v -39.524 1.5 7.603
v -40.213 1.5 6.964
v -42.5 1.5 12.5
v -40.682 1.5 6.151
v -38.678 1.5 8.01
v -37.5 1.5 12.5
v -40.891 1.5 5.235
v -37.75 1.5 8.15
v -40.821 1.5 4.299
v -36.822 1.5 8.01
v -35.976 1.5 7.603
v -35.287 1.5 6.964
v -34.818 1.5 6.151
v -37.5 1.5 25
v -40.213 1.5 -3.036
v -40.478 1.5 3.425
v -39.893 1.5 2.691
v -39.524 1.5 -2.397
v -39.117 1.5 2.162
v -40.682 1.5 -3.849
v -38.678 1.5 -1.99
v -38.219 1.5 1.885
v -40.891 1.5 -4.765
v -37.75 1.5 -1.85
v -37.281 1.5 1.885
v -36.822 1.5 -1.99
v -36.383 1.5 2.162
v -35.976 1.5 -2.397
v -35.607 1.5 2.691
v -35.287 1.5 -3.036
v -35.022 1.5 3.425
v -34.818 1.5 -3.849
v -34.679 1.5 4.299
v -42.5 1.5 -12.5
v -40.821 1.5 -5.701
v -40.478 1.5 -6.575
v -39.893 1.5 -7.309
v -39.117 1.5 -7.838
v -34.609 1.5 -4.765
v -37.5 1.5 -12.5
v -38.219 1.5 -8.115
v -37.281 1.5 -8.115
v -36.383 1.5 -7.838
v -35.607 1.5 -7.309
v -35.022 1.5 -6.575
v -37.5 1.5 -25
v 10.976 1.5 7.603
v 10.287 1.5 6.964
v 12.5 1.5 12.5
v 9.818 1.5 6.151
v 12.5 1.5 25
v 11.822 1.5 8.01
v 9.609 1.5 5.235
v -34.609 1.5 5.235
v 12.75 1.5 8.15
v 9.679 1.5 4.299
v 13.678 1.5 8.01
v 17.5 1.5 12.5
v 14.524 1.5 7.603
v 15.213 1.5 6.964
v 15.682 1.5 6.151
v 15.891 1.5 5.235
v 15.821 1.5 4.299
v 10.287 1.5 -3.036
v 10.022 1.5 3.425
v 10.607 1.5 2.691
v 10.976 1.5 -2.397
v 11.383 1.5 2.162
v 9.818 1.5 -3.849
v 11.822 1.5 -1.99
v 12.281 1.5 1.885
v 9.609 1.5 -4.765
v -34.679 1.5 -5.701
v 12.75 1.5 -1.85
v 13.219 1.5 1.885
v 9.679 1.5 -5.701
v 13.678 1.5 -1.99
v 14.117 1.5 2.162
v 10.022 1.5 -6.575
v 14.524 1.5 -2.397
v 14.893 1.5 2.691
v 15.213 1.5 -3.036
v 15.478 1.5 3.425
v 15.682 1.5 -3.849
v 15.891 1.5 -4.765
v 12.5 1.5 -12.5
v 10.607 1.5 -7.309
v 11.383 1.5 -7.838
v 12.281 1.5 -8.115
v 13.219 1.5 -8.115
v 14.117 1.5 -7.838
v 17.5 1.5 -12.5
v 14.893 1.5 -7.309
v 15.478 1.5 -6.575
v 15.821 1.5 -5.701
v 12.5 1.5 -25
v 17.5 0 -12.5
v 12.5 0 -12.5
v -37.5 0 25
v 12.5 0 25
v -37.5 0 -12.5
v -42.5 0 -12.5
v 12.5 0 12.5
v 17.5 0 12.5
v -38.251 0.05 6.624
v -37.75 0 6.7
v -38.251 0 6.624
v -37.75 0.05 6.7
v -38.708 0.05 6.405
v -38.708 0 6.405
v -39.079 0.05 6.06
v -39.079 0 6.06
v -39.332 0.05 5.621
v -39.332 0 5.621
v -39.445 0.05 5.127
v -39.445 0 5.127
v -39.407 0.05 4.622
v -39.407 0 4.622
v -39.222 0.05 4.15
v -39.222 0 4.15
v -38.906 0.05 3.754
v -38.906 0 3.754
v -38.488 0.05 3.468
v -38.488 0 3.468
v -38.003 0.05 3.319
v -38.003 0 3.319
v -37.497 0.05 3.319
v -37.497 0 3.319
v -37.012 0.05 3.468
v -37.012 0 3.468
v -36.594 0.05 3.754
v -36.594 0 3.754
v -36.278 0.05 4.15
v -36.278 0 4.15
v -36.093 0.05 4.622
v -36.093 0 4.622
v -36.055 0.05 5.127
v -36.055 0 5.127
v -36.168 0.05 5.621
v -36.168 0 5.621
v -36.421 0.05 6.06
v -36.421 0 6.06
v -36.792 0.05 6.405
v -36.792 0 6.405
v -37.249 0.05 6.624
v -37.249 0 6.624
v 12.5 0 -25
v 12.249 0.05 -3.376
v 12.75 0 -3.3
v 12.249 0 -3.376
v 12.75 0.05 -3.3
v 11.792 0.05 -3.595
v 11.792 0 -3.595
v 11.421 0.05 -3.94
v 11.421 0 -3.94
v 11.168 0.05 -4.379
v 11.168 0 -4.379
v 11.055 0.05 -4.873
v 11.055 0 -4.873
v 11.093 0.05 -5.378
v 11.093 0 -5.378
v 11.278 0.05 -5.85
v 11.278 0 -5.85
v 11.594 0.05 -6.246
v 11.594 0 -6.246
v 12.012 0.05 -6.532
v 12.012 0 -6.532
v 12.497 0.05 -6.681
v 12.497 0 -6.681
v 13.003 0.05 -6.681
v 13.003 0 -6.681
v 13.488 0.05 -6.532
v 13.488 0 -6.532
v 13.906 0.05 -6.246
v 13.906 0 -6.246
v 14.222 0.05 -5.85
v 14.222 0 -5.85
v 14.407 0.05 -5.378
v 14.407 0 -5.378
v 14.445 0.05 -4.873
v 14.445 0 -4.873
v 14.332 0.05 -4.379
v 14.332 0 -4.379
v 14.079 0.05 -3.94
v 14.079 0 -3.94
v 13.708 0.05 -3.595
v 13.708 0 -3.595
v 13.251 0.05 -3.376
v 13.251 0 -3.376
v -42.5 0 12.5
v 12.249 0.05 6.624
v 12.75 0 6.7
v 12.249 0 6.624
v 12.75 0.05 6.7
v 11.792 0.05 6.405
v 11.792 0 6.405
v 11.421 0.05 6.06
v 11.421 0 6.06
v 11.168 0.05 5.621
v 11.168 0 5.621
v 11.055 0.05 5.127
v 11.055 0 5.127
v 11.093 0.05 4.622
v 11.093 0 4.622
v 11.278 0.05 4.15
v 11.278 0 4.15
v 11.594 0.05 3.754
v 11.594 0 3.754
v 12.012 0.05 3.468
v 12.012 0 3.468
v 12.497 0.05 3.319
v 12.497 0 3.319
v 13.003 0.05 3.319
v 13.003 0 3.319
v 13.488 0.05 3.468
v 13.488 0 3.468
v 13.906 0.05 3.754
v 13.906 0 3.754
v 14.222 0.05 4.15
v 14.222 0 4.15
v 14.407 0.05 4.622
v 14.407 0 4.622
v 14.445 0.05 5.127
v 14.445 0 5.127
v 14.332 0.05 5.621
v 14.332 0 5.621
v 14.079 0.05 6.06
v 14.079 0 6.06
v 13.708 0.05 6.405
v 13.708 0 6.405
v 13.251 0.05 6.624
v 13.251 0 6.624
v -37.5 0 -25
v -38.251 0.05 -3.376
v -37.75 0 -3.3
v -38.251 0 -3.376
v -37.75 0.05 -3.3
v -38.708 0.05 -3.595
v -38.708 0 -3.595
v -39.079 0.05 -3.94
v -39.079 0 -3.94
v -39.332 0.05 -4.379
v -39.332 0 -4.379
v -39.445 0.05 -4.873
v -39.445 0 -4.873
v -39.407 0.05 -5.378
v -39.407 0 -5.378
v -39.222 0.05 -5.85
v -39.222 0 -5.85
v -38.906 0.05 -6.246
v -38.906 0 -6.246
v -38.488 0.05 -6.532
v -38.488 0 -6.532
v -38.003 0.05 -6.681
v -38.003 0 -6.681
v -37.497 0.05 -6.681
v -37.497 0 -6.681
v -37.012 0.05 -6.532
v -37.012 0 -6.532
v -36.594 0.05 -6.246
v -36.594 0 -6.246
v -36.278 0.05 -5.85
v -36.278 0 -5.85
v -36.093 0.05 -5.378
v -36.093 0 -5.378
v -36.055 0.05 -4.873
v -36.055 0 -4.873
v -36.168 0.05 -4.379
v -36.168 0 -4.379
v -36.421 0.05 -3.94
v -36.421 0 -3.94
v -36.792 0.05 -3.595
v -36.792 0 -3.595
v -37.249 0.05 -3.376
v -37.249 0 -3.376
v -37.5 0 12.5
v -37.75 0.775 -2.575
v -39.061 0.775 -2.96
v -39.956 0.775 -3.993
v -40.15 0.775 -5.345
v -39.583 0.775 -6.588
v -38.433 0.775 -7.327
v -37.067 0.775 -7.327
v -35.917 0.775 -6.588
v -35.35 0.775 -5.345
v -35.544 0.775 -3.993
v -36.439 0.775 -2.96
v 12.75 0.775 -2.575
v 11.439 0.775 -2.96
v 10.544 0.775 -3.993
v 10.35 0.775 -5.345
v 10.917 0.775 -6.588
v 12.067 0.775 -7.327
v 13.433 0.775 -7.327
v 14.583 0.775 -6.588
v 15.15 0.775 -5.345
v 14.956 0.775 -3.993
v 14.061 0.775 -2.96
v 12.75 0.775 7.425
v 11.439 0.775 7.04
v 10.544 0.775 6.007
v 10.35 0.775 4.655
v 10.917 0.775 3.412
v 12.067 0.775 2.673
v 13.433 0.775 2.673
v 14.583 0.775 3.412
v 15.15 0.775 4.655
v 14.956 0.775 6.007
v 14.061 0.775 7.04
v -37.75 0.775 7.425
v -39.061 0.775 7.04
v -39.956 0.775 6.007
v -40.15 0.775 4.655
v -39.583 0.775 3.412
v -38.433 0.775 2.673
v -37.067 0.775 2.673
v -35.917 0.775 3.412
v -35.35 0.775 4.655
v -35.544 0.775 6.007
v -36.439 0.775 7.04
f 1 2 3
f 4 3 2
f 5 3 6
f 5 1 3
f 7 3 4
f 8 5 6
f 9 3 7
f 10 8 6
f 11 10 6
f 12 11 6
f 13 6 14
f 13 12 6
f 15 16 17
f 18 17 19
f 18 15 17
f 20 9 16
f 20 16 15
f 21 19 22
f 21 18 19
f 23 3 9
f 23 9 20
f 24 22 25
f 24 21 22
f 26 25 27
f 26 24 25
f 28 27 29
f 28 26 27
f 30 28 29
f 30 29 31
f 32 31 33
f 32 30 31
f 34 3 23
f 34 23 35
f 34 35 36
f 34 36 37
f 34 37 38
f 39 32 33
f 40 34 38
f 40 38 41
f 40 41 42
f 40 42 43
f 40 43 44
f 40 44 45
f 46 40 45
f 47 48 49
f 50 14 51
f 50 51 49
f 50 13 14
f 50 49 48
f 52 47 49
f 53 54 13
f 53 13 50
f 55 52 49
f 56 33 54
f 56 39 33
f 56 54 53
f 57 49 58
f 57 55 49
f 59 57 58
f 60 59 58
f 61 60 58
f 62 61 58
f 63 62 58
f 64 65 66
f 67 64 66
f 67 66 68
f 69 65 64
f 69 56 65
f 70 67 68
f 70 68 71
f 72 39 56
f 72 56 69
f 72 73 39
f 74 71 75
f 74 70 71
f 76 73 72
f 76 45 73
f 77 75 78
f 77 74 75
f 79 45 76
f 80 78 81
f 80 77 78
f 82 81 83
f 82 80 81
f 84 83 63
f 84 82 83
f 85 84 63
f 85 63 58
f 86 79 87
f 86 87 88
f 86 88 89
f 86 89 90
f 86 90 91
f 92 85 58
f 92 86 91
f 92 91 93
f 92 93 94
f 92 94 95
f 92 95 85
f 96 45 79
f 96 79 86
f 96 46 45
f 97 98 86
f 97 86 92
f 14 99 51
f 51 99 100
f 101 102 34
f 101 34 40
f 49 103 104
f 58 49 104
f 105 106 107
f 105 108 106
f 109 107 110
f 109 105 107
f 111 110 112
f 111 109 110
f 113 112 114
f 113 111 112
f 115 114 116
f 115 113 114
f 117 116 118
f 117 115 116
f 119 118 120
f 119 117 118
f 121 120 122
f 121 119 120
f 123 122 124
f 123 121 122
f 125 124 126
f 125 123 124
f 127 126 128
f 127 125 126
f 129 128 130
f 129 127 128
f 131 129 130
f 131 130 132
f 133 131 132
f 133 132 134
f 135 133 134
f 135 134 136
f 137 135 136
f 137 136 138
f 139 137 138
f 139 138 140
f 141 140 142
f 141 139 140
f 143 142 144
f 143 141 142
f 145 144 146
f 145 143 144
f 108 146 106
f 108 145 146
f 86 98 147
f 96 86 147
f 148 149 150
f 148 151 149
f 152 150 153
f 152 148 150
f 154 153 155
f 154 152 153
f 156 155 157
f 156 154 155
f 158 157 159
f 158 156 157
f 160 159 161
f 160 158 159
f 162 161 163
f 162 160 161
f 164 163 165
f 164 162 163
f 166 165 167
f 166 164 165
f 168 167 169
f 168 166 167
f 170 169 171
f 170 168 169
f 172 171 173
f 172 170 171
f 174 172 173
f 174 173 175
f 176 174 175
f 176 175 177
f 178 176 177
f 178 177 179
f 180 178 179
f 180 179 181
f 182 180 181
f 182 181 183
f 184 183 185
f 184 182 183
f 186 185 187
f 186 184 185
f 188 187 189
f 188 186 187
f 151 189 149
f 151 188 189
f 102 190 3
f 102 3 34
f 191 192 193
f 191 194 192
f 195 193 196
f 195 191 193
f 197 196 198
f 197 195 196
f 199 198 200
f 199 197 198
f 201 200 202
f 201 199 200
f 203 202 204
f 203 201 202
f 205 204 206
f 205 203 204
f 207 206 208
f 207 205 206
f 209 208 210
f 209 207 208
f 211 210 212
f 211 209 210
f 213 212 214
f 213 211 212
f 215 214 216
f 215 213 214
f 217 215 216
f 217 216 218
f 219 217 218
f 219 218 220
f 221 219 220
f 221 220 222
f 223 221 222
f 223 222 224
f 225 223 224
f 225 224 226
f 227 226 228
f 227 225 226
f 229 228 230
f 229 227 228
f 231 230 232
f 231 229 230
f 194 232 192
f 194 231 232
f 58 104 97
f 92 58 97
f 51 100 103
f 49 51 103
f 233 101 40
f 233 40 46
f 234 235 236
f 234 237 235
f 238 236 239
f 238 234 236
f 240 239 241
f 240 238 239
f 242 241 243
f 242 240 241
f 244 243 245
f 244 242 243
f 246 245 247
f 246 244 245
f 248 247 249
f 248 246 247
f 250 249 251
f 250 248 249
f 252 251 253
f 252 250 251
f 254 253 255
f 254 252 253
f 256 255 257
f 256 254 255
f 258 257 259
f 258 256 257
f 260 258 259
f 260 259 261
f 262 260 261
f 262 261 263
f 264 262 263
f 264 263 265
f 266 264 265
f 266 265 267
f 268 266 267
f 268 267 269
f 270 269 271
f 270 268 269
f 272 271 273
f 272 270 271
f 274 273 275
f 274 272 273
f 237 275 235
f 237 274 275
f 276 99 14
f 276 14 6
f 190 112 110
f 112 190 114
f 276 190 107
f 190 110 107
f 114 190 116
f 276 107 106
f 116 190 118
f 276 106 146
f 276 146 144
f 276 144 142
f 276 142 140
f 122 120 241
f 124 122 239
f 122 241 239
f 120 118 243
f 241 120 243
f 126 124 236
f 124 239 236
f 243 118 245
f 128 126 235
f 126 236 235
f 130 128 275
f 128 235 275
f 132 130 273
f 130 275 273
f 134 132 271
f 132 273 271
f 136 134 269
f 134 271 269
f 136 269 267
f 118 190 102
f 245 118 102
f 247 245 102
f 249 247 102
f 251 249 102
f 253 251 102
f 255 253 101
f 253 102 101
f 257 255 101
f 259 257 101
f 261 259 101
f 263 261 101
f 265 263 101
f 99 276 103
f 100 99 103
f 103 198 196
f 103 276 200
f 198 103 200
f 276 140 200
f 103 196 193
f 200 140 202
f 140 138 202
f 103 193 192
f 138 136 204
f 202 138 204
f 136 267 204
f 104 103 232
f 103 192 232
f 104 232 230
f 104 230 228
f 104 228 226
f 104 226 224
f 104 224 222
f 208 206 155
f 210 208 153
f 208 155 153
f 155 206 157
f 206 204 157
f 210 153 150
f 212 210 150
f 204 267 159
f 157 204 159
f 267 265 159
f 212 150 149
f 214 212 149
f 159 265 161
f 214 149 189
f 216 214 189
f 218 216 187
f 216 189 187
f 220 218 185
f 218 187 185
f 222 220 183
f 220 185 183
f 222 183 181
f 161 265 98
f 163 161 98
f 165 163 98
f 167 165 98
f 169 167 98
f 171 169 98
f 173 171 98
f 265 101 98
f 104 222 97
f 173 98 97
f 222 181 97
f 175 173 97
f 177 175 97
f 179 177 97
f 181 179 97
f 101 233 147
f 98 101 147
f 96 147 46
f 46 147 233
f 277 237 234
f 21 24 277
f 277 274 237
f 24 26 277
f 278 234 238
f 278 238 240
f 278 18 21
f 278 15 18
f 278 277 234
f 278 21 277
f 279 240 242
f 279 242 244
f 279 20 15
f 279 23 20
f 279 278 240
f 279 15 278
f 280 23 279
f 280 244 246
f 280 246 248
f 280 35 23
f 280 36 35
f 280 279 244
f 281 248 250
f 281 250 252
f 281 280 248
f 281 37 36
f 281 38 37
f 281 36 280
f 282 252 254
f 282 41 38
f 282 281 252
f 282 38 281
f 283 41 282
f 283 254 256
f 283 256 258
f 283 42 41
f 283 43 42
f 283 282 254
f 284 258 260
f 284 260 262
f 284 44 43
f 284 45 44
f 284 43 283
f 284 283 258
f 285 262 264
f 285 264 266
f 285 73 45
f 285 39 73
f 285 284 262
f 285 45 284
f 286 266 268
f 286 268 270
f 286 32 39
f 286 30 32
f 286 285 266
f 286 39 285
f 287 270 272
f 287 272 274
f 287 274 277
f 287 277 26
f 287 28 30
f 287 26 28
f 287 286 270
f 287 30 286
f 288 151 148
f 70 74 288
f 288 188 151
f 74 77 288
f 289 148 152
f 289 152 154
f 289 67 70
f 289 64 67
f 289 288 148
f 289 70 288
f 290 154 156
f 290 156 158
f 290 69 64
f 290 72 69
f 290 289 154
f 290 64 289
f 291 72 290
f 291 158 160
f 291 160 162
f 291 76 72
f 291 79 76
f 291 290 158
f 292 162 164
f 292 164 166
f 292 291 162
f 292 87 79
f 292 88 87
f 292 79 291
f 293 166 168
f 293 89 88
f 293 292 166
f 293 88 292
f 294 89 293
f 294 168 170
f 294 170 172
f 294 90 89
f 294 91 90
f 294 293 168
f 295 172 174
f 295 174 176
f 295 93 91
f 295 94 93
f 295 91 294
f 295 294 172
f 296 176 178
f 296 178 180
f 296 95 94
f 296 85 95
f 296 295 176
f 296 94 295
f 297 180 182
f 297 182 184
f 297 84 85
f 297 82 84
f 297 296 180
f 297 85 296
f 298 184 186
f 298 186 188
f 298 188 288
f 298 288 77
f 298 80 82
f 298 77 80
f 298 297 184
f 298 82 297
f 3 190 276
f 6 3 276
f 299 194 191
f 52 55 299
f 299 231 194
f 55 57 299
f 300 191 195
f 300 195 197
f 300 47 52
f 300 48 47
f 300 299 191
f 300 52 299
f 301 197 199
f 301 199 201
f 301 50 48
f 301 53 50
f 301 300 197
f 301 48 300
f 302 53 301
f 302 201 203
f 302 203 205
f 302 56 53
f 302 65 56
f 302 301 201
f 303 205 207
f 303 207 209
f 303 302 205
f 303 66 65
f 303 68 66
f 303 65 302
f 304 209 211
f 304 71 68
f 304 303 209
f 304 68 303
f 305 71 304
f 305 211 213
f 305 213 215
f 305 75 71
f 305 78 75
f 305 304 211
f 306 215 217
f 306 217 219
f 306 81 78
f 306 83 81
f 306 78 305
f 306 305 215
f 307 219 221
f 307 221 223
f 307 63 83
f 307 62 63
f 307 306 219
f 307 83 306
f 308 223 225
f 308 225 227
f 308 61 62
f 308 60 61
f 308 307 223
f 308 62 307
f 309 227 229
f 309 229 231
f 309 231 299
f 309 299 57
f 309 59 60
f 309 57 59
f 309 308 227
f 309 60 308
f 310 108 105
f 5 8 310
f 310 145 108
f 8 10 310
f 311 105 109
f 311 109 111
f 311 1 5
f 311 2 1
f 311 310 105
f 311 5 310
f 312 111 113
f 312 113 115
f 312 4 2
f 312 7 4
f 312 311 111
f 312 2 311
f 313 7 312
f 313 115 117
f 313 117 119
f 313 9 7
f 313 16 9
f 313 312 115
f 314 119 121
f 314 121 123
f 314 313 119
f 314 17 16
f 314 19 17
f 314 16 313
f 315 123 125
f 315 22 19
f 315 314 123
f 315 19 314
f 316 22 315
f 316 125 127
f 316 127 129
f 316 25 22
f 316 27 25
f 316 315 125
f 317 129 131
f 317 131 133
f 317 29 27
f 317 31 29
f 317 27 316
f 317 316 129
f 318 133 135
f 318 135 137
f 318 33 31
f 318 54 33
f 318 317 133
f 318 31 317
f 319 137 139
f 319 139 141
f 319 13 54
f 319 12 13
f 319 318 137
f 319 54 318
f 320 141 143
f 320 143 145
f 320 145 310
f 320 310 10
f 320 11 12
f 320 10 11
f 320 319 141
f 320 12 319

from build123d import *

# Parameters (mm, degrees)
SKETCH1_W                                    = 5
SKETCH1_H                                    = 25
SKETCH1_W_2                                  = 25
SKETCH1_H_2                                  = 50
BOSS_EXTRUDE1_DEPTH                          = 1.5
CSK_FOR_M3_COUNTERSUNK_FLAT_HEAD_SCR_2_COUNT = 2
CSK_FOR_M3_COUNTERSUNK_FLAT_HEAD_SCR_2_PITCH = 10
CSK_FOR_M3_COUNTERSUNK_FLAT_HEAD_SCR_3_COUNT = 2
CSK_FOR_M3_COUNTERSUNK_FLAT_HEAD_SCR_3_PITCH = 51.480578862
CSK_FOR_M3_COUNTERSUNK_FLAT_HEAD_SCR_4_COUNT = 2
CSK_FOR_M3_COUNTERSUNK_FLAT_HEAD_SCR_4_PITCH = 50.5


with BuildPart() as part:
    # Sketch1 → Boss-Extrude1 (new body)
    with BuildSketch(Plane(origin=(0, 0, 0), x_dir=(1, 0, 0), z_dir=(0, 1, 0))):
        Polygon((12.5, 25), (-12.5, 25), (-12.5, -25), (12.5, -25), (12.5, -12.5), (12.5, 12.5), align=None)
        with Locations((15, 0)):
            Rectangle(SKETCH1_W, SKETCH1_H)
        with Locations((-25, 0)):
            Rectangle(SKETCH1_W_2, SKETCH1_H_2)
        with Locations((-40, 0)):
            Rectangle(SKETCH1_W, SKETCH1_H)
    extrude(amount=BOSS_EXTRUDE1_DEPTH)

    # Sketch3 → CSK for M3 Countersunk Flat Head Screw1 (revolve, cut)
    with BuildSketch(Plane(origin=(12.75, 1.5, 5), x_dir=(0, 0, 1), z_dir=(1, 0, 0))):
        Polygon((0, 0), (0, 1.5), (1.7, 1.5), (1.7, 1.45), (3.15, 0), align=None)
    csk_for_m3_countersunk_flat_head_screw1 = revolve(axis=Axis((12.75, 7.85, 5), (0, -1, 0)), mode=Mode.SUBTRACT)

    # CSK for M3 Countersunk Flat Head Scr 2: CSK for M3 Countersunk Flat Head Screw1 ×2
    with Locations(*[(0, 0, -i * CSK_FOR_M3_COUNTERSUNK_FLAT_HEAD_SCR_2_PITCH) for i in range(1, CSK_FOR_M3_COUNTERSUNK_FLAT_HEAD_SCR_2_COUNT)]):
        add(csk_for_m3_countersunk_flat_head_screw1, mode=Mode.SUBTRACT)

    # CSK for M3 Countersunk Flat Head Scr 3: CSK for M3 Countersunk Flat Head Screw1 ×2
    with Locations(*[Vector(-0.9809524507300751, 0, -0.19424801004555947) * (i * CSK_FOR_M3_COUNTERSUNK_FLAT_HEAD_SCR_3_PITCH) for i in range(1, CSK_FOR_M3_COUNTERSUNK_FLAT_HEAD_SCR_3_COUNT)]):
        add(csk_for_m3_countersunk_flat_head_screw1, mode=Mode.SUBTRACT)

    # CSK for M3 Countersunk Flat Head Scr 4: CSK for M3 Countersunk Flat Head Screw1 ×2
    with Locations(*[(-i * CSK_FOR_M3_COUNTERSUNK_FLAT_HEAD_SCR_4_PITCH, 0, 0) for i in range(1, CSK_FOR_M3_COUNTERSUNK_FLAT_HEAD_SCR_4_COUNT)]):
        add(csk_for_m3_countersunk_flat_head_screw1, mode=Mode.SUBTRACT)


solid = part.part
